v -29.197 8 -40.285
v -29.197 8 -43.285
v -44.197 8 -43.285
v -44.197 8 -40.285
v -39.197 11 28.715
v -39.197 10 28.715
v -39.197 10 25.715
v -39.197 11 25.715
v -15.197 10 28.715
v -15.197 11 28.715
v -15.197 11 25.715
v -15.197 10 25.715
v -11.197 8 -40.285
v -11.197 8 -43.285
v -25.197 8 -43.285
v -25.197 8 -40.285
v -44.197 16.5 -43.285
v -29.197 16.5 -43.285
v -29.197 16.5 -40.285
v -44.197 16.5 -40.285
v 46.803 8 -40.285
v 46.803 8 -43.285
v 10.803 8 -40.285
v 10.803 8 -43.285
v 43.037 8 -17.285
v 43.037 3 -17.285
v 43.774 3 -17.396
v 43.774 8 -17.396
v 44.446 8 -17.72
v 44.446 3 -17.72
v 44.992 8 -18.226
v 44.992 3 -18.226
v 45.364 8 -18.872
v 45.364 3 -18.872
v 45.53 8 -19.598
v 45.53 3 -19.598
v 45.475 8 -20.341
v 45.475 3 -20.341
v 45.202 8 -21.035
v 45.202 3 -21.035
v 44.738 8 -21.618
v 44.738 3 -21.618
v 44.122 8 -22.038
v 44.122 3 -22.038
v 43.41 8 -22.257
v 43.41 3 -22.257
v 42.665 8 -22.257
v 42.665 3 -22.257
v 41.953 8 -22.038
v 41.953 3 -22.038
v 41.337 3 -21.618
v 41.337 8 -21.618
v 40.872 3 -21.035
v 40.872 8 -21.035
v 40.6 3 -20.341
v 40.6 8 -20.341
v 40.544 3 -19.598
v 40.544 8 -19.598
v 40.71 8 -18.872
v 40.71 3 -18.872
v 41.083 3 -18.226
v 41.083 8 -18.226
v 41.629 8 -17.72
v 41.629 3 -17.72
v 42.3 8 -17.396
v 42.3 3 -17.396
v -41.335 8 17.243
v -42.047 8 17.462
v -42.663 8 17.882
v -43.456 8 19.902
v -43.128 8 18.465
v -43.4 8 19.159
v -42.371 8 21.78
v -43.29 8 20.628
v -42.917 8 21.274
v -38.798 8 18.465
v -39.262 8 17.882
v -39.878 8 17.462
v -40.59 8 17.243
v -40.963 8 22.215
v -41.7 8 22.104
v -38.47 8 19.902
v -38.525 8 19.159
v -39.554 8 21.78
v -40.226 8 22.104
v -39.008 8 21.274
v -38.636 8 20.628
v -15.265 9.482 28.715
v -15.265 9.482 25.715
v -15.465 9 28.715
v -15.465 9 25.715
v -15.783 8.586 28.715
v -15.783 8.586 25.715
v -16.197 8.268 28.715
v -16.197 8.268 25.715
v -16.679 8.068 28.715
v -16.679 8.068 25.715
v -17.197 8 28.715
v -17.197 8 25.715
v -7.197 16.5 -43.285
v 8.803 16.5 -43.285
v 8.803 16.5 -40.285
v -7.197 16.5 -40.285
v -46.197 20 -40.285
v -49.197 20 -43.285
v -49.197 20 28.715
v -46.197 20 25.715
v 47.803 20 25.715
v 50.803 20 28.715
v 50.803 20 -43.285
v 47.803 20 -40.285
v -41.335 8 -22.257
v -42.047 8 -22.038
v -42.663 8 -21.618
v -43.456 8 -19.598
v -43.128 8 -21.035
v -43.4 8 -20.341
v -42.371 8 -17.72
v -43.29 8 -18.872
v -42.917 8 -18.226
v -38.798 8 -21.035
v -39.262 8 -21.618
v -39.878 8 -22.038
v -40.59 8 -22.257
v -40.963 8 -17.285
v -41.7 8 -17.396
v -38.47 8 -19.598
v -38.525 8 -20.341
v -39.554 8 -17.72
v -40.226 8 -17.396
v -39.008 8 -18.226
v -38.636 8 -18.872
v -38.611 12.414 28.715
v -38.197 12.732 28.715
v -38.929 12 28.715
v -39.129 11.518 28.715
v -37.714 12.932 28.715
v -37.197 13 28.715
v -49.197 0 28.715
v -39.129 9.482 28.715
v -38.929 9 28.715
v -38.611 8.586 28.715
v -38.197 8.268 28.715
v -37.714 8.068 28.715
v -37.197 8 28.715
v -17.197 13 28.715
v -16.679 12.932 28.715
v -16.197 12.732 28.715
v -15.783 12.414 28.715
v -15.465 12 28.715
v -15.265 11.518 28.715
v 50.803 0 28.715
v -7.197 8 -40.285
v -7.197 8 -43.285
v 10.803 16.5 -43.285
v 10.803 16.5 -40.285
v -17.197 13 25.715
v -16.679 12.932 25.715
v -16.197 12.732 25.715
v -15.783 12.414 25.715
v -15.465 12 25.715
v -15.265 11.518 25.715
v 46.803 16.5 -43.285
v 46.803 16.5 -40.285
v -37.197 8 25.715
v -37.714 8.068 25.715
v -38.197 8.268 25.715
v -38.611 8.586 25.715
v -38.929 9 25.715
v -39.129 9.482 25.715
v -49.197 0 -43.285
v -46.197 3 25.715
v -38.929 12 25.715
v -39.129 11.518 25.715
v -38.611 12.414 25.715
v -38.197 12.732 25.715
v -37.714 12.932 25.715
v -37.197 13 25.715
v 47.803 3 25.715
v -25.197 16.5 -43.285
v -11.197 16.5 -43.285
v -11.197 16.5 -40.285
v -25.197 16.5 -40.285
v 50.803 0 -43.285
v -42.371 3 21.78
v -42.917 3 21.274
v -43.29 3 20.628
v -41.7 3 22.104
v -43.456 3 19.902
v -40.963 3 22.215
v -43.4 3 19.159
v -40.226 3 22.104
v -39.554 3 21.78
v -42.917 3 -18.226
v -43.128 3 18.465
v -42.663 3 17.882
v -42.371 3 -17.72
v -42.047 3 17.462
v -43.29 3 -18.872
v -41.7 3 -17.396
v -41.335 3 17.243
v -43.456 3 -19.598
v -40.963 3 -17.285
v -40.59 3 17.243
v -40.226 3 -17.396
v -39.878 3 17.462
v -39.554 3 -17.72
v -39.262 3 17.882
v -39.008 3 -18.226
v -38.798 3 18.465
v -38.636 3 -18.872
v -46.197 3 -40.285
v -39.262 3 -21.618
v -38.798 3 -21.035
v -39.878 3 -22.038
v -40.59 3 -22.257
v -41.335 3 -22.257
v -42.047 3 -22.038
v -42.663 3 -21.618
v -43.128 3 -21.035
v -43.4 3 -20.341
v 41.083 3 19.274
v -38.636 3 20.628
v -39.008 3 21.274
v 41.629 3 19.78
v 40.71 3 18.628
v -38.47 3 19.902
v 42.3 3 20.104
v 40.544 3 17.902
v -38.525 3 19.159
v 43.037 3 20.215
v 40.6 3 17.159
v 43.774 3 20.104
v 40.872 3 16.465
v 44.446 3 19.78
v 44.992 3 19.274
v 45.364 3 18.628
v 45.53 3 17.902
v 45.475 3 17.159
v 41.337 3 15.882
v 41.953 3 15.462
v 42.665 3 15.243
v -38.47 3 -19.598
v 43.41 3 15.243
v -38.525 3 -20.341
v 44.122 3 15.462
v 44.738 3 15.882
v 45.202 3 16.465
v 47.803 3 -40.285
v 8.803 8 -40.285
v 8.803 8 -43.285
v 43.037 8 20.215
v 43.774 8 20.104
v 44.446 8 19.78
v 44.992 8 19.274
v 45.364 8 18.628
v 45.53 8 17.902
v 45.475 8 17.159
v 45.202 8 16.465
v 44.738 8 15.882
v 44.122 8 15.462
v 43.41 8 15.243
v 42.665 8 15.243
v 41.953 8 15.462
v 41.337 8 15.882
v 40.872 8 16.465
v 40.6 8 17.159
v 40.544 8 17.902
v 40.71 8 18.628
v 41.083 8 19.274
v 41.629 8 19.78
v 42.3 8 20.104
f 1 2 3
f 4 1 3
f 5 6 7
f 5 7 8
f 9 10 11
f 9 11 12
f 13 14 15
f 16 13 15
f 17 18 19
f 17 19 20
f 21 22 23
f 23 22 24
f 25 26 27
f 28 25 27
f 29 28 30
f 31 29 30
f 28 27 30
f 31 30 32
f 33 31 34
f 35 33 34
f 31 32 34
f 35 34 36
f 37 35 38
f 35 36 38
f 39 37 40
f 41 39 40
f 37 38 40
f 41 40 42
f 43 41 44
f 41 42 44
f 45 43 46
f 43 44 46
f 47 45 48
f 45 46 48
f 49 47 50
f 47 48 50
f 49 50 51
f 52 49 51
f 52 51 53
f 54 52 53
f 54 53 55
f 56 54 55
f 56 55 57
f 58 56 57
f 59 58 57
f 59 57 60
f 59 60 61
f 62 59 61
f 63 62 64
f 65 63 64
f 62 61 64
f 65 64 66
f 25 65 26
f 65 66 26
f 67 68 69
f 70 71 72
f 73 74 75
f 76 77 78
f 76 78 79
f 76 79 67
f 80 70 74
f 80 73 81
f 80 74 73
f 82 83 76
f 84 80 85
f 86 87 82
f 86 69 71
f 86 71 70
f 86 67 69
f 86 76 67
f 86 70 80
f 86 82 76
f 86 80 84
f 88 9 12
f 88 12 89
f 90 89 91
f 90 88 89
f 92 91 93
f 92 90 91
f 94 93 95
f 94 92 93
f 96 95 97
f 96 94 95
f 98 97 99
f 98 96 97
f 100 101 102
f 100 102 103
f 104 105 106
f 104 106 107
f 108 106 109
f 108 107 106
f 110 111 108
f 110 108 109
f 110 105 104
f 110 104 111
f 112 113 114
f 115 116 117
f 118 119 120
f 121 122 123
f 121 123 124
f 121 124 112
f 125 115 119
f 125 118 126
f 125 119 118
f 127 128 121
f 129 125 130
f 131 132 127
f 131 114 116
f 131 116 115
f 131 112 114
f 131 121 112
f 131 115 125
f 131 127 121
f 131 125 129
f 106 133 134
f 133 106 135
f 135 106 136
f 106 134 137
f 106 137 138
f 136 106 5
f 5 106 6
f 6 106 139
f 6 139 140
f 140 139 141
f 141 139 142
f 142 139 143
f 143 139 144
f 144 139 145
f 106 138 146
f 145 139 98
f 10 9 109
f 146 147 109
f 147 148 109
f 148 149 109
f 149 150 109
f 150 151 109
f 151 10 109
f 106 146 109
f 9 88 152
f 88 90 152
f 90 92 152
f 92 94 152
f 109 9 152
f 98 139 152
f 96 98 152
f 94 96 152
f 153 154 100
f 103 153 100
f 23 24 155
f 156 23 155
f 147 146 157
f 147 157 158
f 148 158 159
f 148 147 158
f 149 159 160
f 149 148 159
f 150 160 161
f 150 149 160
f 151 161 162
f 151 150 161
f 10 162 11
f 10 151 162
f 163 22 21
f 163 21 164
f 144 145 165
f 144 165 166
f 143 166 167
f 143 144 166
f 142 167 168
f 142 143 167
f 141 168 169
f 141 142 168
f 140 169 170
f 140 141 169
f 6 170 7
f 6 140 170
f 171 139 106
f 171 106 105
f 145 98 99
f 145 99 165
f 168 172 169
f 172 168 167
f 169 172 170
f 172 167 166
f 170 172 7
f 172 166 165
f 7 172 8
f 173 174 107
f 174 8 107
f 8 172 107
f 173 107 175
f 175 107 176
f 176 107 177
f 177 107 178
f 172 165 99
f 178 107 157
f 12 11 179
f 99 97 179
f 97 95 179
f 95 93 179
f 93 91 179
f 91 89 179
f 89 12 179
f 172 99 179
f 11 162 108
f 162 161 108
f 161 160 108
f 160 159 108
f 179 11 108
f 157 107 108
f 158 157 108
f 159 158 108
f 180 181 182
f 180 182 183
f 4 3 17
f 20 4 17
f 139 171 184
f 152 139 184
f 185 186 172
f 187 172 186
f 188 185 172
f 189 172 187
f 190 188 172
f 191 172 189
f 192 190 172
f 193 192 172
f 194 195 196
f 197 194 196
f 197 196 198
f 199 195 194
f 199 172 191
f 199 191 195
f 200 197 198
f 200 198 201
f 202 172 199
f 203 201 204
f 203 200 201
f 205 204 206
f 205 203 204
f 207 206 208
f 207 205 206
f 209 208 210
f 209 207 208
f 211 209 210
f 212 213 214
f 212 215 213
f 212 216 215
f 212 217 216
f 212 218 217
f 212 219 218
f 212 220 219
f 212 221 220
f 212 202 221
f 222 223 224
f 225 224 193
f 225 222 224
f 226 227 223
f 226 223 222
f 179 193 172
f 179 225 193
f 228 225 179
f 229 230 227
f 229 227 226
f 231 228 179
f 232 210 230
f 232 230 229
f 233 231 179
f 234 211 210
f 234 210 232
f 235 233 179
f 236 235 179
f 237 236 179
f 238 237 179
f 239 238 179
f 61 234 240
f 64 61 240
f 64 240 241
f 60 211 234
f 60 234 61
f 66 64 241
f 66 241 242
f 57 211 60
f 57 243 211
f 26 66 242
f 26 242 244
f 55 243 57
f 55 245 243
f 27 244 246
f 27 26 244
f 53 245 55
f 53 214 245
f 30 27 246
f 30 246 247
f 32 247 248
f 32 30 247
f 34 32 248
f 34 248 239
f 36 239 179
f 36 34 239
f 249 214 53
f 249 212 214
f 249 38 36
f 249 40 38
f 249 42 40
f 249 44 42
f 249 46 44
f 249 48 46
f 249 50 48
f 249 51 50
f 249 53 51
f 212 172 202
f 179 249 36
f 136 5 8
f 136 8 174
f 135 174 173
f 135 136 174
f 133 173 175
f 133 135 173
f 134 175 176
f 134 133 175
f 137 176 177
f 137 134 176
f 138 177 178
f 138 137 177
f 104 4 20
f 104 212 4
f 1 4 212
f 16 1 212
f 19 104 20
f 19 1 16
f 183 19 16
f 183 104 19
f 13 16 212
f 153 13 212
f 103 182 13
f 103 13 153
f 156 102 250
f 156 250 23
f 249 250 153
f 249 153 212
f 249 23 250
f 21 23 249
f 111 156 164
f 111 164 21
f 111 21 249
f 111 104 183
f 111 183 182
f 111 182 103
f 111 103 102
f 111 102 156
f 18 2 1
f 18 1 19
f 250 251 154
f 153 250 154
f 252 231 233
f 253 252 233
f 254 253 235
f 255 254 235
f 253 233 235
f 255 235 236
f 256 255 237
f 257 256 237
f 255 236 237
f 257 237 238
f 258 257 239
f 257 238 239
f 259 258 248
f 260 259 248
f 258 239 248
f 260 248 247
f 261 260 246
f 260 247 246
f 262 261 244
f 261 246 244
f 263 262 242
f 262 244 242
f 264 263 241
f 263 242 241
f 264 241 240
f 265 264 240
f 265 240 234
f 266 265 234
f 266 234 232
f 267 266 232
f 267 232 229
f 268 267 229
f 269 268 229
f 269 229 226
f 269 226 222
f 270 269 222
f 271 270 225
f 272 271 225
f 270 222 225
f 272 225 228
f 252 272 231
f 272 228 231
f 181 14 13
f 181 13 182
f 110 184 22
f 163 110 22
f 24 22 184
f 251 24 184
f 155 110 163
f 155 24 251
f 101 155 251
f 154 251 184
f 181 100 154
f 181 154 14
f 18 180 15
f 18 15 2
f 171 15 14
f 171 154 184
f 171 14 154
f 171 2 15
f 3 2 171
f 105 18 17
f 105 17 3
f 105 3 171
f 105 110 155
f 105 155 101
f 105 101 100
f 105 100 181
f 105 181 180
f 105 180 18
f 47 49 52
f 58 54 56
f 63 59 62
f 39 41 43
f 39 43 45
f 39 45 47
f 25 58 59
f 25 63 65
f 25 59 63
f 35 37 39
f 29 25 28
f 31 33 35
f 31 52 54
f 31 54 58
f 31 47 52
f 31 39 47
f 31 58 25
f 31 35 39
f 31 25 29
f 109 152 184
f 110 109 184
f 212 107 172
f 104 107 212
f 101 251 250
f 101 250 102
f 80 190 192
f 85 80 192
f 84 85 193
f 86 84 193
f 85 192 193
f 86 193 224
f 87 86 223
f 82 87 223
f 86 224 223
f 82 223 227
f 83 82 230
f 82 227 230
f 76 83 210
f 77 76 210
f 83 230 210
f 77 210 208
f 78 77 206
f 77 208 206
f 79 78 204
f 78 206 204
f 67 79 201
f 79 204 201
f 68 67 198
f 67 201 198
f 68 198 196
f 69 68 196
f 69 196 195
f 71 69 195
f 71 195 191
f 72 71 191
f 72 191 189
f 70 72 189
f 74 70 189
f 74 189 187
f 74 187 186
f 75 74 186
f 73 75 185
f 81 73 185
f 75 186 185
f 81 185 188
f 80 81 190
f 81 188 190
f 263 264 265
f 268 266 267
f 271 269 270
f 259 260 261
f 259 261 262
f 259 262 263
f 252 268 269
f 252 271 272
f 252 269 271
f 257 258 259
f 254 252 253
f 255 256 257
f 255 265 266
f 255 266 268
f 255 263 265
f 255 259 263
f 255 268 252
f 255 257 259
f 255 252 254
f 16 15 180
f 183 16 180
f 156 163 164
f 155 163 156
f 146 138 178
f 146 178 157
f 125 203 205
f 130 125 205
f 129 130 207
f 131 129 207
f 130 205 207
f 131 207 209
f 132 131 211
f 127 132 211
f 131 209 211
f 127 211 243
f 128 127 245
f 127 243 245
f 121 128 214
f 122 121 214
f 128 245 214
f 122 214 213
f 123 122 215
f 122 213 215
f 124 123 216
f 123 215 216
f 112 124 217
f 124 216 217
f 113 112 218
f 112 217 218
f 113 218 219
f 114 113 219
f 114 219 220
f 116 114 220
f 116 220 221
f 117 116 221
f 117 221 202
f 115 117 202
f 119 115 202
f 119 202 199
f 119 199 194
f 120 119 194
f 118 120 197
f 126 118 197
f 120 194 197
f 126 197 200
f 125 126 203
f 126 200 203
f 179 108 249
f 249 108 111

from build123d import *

# Parameters (mm, degrees)
SKETCH1_W           = 100
SKETCH1_H           = 72
BOSS_EXTRUDE1_DEPTH = 20
SKETCH2_W           = 94
SKETCH2_H           = 66
CUT_EXTRUDE1_DEPTH  = 17
SKETCH3_R           = 2.5
BOSS_EXTRUDE2_DEPTH = 5
SKETCH6_W           = 36
SKETCH6_H           = 8.5
SKETCH6_W_2         = 14
SKETCH6_W_3         = 16
SKETCH6_W_4         = 15
BOSS_EXTRUDE4_DEPTH = 12
SKETCH6_6_W         = 36
SKETCH6_6_H         = 8.5
SKETCH6_6_W_2       = 14
SKETCH6_6_W_3       = 16
SKETCH6_6_W_4       = 15
CUT_EXTRUDE2_DEPTH  = 18
CUT_EXTRUDE4_DEPTH  = 18


with BuildPart() as part:
    # Sketch1 → Boss-Extrude1 (new body)
    with BuildSketch(Plane(origin=(0, 0, 0), x_dir=(1, 0, 0), z_dir=(0, 1, 0))):
        with Locations((0.803212851, 7.285140562)):
            Rectangle(SKETCH1_W, SKETCH1_H)
    extrude(amount=BOSS_EXTRUDE1_DEPTH)

    # Sketch2 → Cut-Extrude1 (cut)
    with BuildSketch(Plane(origin=(0, 20, 0), x_dir=(1, 0, 0), z_dir=(0, 1, 0))):
        with Locations((0.803212851, 7.285140562)):
            Rectangle(SKETCH2_W, SKETCH2_H)
    extrude(amount=-CUT_EXTRUDE1_DEPTH, mode=Mode.SUBTRACT)

    # Sketch3 → Boss-Extrude2 (add)
    with BuildSketch(Plane(origin=(0, 3, 0), x_dir=(1, 0, 0), z_dir=(0, 1, 0))):
        with Locations((-40.962789341, -19.714859438)):
            Circle(SKETCH3_R)
        with Locations((-40.962789341, 19.785140562)):
            Circle(SKETCH3_R)
        with Locations((43.037210659, -17.714859438)):
            Circle(SKETCH3_R)
        with Locations((43.037210659, 19.785140562)):
            Circle(SKETCH3_R)
    extrude(amount=BOSS_EXTRUDE2_DEPTH)

    # Sketch6 → Boss-Extrude4 (add)
    with BuildSketch(Plane(origin=(0, 0, -43.285140562), x_dir=(-1, 0, 0), z_dir=(0, 0, -1))):
        with Locations((-28.803212851, 12.25)):
            Rectangle(SKETCH6_W, SKETCH6_H)
        with Locations((18.196787149, 12.25)):
            Rectangle(SKETCH6_W_2, SKETCH6_H)
        with Locations((-0.803212851, 12.25)):
            Rectangle(SKETCH6_W_3, SKETCH6_H)
        with Locations((36.696787149, 12.25)):
            Rectangle(SKETCH6_W_4, SKETCH6_H)
    extrude(amount=-BOSS_EXTRUDE4_DEPTH)

    # Sketch6<6> → Cut-Extrude2 (cut)
    with BuildSketch(Plane(origin=(0, 0, -43.285140562), x_dir=(-1, 0, 0), z_dir=(0, 0, -1))):
        with Locations((-28.803212851, 12.25)):
            Rectangle(SKETCH6_6_W, SKETCH6_6_H)
        with Locations((18.196787149, 12.25)):
            Rectangle(SKETCH6_6_W_2, SKETCH6_6_H)
        with Locations((-0.803212851, 12.25)):
            Rectangle(SKETCH6_6_W_3, SKETCH6_6_H)
        with Locations((36.696787149, 12.25)):
            Rectangle(SKETCH6_6_W_4, SKETCH6_6_H)
    extrude(amount=-CUT_EXTRUDE2_DEPTH, mode=Mode.SUBTRACT)

    # usb type-c → Cut-Extrude4 (cut)
    with BuildSketch(Plane.XY.offset(28.714859438)):
        with BuildLine():
            Line((-37.196787149, 13), (-17.196787149, 13))
            ThreePointArc((-17.196787149, 13), (-15.782573586, 12.414213562), (-15.196787149, 11))
            Line((-15.196787149, 11), (-15.196787149, 10))
            ThreePointArc((-15.196787149, 10), (-15.782573586, 8.585786438), (-17.196787149, 8))
            Line((-17.196787149, 8), (-37.196787149, 8))
            ThreePointArc((-37.196787149, 8), (-38.611000711, 8.585786438), (-39.196787149, 10))
            Line((-39.196787149, 10), (-39.196787149, 11))
            ThreePointArc((-39.196787149, 11), (-38.611000711, 12.414213562), (-37.196787149, 13))
        make_face()
    extrude(amount=-CUT_EXTRUDE4_DEPTH, mode=Mode.SUBTRACT)


solid = part.part
